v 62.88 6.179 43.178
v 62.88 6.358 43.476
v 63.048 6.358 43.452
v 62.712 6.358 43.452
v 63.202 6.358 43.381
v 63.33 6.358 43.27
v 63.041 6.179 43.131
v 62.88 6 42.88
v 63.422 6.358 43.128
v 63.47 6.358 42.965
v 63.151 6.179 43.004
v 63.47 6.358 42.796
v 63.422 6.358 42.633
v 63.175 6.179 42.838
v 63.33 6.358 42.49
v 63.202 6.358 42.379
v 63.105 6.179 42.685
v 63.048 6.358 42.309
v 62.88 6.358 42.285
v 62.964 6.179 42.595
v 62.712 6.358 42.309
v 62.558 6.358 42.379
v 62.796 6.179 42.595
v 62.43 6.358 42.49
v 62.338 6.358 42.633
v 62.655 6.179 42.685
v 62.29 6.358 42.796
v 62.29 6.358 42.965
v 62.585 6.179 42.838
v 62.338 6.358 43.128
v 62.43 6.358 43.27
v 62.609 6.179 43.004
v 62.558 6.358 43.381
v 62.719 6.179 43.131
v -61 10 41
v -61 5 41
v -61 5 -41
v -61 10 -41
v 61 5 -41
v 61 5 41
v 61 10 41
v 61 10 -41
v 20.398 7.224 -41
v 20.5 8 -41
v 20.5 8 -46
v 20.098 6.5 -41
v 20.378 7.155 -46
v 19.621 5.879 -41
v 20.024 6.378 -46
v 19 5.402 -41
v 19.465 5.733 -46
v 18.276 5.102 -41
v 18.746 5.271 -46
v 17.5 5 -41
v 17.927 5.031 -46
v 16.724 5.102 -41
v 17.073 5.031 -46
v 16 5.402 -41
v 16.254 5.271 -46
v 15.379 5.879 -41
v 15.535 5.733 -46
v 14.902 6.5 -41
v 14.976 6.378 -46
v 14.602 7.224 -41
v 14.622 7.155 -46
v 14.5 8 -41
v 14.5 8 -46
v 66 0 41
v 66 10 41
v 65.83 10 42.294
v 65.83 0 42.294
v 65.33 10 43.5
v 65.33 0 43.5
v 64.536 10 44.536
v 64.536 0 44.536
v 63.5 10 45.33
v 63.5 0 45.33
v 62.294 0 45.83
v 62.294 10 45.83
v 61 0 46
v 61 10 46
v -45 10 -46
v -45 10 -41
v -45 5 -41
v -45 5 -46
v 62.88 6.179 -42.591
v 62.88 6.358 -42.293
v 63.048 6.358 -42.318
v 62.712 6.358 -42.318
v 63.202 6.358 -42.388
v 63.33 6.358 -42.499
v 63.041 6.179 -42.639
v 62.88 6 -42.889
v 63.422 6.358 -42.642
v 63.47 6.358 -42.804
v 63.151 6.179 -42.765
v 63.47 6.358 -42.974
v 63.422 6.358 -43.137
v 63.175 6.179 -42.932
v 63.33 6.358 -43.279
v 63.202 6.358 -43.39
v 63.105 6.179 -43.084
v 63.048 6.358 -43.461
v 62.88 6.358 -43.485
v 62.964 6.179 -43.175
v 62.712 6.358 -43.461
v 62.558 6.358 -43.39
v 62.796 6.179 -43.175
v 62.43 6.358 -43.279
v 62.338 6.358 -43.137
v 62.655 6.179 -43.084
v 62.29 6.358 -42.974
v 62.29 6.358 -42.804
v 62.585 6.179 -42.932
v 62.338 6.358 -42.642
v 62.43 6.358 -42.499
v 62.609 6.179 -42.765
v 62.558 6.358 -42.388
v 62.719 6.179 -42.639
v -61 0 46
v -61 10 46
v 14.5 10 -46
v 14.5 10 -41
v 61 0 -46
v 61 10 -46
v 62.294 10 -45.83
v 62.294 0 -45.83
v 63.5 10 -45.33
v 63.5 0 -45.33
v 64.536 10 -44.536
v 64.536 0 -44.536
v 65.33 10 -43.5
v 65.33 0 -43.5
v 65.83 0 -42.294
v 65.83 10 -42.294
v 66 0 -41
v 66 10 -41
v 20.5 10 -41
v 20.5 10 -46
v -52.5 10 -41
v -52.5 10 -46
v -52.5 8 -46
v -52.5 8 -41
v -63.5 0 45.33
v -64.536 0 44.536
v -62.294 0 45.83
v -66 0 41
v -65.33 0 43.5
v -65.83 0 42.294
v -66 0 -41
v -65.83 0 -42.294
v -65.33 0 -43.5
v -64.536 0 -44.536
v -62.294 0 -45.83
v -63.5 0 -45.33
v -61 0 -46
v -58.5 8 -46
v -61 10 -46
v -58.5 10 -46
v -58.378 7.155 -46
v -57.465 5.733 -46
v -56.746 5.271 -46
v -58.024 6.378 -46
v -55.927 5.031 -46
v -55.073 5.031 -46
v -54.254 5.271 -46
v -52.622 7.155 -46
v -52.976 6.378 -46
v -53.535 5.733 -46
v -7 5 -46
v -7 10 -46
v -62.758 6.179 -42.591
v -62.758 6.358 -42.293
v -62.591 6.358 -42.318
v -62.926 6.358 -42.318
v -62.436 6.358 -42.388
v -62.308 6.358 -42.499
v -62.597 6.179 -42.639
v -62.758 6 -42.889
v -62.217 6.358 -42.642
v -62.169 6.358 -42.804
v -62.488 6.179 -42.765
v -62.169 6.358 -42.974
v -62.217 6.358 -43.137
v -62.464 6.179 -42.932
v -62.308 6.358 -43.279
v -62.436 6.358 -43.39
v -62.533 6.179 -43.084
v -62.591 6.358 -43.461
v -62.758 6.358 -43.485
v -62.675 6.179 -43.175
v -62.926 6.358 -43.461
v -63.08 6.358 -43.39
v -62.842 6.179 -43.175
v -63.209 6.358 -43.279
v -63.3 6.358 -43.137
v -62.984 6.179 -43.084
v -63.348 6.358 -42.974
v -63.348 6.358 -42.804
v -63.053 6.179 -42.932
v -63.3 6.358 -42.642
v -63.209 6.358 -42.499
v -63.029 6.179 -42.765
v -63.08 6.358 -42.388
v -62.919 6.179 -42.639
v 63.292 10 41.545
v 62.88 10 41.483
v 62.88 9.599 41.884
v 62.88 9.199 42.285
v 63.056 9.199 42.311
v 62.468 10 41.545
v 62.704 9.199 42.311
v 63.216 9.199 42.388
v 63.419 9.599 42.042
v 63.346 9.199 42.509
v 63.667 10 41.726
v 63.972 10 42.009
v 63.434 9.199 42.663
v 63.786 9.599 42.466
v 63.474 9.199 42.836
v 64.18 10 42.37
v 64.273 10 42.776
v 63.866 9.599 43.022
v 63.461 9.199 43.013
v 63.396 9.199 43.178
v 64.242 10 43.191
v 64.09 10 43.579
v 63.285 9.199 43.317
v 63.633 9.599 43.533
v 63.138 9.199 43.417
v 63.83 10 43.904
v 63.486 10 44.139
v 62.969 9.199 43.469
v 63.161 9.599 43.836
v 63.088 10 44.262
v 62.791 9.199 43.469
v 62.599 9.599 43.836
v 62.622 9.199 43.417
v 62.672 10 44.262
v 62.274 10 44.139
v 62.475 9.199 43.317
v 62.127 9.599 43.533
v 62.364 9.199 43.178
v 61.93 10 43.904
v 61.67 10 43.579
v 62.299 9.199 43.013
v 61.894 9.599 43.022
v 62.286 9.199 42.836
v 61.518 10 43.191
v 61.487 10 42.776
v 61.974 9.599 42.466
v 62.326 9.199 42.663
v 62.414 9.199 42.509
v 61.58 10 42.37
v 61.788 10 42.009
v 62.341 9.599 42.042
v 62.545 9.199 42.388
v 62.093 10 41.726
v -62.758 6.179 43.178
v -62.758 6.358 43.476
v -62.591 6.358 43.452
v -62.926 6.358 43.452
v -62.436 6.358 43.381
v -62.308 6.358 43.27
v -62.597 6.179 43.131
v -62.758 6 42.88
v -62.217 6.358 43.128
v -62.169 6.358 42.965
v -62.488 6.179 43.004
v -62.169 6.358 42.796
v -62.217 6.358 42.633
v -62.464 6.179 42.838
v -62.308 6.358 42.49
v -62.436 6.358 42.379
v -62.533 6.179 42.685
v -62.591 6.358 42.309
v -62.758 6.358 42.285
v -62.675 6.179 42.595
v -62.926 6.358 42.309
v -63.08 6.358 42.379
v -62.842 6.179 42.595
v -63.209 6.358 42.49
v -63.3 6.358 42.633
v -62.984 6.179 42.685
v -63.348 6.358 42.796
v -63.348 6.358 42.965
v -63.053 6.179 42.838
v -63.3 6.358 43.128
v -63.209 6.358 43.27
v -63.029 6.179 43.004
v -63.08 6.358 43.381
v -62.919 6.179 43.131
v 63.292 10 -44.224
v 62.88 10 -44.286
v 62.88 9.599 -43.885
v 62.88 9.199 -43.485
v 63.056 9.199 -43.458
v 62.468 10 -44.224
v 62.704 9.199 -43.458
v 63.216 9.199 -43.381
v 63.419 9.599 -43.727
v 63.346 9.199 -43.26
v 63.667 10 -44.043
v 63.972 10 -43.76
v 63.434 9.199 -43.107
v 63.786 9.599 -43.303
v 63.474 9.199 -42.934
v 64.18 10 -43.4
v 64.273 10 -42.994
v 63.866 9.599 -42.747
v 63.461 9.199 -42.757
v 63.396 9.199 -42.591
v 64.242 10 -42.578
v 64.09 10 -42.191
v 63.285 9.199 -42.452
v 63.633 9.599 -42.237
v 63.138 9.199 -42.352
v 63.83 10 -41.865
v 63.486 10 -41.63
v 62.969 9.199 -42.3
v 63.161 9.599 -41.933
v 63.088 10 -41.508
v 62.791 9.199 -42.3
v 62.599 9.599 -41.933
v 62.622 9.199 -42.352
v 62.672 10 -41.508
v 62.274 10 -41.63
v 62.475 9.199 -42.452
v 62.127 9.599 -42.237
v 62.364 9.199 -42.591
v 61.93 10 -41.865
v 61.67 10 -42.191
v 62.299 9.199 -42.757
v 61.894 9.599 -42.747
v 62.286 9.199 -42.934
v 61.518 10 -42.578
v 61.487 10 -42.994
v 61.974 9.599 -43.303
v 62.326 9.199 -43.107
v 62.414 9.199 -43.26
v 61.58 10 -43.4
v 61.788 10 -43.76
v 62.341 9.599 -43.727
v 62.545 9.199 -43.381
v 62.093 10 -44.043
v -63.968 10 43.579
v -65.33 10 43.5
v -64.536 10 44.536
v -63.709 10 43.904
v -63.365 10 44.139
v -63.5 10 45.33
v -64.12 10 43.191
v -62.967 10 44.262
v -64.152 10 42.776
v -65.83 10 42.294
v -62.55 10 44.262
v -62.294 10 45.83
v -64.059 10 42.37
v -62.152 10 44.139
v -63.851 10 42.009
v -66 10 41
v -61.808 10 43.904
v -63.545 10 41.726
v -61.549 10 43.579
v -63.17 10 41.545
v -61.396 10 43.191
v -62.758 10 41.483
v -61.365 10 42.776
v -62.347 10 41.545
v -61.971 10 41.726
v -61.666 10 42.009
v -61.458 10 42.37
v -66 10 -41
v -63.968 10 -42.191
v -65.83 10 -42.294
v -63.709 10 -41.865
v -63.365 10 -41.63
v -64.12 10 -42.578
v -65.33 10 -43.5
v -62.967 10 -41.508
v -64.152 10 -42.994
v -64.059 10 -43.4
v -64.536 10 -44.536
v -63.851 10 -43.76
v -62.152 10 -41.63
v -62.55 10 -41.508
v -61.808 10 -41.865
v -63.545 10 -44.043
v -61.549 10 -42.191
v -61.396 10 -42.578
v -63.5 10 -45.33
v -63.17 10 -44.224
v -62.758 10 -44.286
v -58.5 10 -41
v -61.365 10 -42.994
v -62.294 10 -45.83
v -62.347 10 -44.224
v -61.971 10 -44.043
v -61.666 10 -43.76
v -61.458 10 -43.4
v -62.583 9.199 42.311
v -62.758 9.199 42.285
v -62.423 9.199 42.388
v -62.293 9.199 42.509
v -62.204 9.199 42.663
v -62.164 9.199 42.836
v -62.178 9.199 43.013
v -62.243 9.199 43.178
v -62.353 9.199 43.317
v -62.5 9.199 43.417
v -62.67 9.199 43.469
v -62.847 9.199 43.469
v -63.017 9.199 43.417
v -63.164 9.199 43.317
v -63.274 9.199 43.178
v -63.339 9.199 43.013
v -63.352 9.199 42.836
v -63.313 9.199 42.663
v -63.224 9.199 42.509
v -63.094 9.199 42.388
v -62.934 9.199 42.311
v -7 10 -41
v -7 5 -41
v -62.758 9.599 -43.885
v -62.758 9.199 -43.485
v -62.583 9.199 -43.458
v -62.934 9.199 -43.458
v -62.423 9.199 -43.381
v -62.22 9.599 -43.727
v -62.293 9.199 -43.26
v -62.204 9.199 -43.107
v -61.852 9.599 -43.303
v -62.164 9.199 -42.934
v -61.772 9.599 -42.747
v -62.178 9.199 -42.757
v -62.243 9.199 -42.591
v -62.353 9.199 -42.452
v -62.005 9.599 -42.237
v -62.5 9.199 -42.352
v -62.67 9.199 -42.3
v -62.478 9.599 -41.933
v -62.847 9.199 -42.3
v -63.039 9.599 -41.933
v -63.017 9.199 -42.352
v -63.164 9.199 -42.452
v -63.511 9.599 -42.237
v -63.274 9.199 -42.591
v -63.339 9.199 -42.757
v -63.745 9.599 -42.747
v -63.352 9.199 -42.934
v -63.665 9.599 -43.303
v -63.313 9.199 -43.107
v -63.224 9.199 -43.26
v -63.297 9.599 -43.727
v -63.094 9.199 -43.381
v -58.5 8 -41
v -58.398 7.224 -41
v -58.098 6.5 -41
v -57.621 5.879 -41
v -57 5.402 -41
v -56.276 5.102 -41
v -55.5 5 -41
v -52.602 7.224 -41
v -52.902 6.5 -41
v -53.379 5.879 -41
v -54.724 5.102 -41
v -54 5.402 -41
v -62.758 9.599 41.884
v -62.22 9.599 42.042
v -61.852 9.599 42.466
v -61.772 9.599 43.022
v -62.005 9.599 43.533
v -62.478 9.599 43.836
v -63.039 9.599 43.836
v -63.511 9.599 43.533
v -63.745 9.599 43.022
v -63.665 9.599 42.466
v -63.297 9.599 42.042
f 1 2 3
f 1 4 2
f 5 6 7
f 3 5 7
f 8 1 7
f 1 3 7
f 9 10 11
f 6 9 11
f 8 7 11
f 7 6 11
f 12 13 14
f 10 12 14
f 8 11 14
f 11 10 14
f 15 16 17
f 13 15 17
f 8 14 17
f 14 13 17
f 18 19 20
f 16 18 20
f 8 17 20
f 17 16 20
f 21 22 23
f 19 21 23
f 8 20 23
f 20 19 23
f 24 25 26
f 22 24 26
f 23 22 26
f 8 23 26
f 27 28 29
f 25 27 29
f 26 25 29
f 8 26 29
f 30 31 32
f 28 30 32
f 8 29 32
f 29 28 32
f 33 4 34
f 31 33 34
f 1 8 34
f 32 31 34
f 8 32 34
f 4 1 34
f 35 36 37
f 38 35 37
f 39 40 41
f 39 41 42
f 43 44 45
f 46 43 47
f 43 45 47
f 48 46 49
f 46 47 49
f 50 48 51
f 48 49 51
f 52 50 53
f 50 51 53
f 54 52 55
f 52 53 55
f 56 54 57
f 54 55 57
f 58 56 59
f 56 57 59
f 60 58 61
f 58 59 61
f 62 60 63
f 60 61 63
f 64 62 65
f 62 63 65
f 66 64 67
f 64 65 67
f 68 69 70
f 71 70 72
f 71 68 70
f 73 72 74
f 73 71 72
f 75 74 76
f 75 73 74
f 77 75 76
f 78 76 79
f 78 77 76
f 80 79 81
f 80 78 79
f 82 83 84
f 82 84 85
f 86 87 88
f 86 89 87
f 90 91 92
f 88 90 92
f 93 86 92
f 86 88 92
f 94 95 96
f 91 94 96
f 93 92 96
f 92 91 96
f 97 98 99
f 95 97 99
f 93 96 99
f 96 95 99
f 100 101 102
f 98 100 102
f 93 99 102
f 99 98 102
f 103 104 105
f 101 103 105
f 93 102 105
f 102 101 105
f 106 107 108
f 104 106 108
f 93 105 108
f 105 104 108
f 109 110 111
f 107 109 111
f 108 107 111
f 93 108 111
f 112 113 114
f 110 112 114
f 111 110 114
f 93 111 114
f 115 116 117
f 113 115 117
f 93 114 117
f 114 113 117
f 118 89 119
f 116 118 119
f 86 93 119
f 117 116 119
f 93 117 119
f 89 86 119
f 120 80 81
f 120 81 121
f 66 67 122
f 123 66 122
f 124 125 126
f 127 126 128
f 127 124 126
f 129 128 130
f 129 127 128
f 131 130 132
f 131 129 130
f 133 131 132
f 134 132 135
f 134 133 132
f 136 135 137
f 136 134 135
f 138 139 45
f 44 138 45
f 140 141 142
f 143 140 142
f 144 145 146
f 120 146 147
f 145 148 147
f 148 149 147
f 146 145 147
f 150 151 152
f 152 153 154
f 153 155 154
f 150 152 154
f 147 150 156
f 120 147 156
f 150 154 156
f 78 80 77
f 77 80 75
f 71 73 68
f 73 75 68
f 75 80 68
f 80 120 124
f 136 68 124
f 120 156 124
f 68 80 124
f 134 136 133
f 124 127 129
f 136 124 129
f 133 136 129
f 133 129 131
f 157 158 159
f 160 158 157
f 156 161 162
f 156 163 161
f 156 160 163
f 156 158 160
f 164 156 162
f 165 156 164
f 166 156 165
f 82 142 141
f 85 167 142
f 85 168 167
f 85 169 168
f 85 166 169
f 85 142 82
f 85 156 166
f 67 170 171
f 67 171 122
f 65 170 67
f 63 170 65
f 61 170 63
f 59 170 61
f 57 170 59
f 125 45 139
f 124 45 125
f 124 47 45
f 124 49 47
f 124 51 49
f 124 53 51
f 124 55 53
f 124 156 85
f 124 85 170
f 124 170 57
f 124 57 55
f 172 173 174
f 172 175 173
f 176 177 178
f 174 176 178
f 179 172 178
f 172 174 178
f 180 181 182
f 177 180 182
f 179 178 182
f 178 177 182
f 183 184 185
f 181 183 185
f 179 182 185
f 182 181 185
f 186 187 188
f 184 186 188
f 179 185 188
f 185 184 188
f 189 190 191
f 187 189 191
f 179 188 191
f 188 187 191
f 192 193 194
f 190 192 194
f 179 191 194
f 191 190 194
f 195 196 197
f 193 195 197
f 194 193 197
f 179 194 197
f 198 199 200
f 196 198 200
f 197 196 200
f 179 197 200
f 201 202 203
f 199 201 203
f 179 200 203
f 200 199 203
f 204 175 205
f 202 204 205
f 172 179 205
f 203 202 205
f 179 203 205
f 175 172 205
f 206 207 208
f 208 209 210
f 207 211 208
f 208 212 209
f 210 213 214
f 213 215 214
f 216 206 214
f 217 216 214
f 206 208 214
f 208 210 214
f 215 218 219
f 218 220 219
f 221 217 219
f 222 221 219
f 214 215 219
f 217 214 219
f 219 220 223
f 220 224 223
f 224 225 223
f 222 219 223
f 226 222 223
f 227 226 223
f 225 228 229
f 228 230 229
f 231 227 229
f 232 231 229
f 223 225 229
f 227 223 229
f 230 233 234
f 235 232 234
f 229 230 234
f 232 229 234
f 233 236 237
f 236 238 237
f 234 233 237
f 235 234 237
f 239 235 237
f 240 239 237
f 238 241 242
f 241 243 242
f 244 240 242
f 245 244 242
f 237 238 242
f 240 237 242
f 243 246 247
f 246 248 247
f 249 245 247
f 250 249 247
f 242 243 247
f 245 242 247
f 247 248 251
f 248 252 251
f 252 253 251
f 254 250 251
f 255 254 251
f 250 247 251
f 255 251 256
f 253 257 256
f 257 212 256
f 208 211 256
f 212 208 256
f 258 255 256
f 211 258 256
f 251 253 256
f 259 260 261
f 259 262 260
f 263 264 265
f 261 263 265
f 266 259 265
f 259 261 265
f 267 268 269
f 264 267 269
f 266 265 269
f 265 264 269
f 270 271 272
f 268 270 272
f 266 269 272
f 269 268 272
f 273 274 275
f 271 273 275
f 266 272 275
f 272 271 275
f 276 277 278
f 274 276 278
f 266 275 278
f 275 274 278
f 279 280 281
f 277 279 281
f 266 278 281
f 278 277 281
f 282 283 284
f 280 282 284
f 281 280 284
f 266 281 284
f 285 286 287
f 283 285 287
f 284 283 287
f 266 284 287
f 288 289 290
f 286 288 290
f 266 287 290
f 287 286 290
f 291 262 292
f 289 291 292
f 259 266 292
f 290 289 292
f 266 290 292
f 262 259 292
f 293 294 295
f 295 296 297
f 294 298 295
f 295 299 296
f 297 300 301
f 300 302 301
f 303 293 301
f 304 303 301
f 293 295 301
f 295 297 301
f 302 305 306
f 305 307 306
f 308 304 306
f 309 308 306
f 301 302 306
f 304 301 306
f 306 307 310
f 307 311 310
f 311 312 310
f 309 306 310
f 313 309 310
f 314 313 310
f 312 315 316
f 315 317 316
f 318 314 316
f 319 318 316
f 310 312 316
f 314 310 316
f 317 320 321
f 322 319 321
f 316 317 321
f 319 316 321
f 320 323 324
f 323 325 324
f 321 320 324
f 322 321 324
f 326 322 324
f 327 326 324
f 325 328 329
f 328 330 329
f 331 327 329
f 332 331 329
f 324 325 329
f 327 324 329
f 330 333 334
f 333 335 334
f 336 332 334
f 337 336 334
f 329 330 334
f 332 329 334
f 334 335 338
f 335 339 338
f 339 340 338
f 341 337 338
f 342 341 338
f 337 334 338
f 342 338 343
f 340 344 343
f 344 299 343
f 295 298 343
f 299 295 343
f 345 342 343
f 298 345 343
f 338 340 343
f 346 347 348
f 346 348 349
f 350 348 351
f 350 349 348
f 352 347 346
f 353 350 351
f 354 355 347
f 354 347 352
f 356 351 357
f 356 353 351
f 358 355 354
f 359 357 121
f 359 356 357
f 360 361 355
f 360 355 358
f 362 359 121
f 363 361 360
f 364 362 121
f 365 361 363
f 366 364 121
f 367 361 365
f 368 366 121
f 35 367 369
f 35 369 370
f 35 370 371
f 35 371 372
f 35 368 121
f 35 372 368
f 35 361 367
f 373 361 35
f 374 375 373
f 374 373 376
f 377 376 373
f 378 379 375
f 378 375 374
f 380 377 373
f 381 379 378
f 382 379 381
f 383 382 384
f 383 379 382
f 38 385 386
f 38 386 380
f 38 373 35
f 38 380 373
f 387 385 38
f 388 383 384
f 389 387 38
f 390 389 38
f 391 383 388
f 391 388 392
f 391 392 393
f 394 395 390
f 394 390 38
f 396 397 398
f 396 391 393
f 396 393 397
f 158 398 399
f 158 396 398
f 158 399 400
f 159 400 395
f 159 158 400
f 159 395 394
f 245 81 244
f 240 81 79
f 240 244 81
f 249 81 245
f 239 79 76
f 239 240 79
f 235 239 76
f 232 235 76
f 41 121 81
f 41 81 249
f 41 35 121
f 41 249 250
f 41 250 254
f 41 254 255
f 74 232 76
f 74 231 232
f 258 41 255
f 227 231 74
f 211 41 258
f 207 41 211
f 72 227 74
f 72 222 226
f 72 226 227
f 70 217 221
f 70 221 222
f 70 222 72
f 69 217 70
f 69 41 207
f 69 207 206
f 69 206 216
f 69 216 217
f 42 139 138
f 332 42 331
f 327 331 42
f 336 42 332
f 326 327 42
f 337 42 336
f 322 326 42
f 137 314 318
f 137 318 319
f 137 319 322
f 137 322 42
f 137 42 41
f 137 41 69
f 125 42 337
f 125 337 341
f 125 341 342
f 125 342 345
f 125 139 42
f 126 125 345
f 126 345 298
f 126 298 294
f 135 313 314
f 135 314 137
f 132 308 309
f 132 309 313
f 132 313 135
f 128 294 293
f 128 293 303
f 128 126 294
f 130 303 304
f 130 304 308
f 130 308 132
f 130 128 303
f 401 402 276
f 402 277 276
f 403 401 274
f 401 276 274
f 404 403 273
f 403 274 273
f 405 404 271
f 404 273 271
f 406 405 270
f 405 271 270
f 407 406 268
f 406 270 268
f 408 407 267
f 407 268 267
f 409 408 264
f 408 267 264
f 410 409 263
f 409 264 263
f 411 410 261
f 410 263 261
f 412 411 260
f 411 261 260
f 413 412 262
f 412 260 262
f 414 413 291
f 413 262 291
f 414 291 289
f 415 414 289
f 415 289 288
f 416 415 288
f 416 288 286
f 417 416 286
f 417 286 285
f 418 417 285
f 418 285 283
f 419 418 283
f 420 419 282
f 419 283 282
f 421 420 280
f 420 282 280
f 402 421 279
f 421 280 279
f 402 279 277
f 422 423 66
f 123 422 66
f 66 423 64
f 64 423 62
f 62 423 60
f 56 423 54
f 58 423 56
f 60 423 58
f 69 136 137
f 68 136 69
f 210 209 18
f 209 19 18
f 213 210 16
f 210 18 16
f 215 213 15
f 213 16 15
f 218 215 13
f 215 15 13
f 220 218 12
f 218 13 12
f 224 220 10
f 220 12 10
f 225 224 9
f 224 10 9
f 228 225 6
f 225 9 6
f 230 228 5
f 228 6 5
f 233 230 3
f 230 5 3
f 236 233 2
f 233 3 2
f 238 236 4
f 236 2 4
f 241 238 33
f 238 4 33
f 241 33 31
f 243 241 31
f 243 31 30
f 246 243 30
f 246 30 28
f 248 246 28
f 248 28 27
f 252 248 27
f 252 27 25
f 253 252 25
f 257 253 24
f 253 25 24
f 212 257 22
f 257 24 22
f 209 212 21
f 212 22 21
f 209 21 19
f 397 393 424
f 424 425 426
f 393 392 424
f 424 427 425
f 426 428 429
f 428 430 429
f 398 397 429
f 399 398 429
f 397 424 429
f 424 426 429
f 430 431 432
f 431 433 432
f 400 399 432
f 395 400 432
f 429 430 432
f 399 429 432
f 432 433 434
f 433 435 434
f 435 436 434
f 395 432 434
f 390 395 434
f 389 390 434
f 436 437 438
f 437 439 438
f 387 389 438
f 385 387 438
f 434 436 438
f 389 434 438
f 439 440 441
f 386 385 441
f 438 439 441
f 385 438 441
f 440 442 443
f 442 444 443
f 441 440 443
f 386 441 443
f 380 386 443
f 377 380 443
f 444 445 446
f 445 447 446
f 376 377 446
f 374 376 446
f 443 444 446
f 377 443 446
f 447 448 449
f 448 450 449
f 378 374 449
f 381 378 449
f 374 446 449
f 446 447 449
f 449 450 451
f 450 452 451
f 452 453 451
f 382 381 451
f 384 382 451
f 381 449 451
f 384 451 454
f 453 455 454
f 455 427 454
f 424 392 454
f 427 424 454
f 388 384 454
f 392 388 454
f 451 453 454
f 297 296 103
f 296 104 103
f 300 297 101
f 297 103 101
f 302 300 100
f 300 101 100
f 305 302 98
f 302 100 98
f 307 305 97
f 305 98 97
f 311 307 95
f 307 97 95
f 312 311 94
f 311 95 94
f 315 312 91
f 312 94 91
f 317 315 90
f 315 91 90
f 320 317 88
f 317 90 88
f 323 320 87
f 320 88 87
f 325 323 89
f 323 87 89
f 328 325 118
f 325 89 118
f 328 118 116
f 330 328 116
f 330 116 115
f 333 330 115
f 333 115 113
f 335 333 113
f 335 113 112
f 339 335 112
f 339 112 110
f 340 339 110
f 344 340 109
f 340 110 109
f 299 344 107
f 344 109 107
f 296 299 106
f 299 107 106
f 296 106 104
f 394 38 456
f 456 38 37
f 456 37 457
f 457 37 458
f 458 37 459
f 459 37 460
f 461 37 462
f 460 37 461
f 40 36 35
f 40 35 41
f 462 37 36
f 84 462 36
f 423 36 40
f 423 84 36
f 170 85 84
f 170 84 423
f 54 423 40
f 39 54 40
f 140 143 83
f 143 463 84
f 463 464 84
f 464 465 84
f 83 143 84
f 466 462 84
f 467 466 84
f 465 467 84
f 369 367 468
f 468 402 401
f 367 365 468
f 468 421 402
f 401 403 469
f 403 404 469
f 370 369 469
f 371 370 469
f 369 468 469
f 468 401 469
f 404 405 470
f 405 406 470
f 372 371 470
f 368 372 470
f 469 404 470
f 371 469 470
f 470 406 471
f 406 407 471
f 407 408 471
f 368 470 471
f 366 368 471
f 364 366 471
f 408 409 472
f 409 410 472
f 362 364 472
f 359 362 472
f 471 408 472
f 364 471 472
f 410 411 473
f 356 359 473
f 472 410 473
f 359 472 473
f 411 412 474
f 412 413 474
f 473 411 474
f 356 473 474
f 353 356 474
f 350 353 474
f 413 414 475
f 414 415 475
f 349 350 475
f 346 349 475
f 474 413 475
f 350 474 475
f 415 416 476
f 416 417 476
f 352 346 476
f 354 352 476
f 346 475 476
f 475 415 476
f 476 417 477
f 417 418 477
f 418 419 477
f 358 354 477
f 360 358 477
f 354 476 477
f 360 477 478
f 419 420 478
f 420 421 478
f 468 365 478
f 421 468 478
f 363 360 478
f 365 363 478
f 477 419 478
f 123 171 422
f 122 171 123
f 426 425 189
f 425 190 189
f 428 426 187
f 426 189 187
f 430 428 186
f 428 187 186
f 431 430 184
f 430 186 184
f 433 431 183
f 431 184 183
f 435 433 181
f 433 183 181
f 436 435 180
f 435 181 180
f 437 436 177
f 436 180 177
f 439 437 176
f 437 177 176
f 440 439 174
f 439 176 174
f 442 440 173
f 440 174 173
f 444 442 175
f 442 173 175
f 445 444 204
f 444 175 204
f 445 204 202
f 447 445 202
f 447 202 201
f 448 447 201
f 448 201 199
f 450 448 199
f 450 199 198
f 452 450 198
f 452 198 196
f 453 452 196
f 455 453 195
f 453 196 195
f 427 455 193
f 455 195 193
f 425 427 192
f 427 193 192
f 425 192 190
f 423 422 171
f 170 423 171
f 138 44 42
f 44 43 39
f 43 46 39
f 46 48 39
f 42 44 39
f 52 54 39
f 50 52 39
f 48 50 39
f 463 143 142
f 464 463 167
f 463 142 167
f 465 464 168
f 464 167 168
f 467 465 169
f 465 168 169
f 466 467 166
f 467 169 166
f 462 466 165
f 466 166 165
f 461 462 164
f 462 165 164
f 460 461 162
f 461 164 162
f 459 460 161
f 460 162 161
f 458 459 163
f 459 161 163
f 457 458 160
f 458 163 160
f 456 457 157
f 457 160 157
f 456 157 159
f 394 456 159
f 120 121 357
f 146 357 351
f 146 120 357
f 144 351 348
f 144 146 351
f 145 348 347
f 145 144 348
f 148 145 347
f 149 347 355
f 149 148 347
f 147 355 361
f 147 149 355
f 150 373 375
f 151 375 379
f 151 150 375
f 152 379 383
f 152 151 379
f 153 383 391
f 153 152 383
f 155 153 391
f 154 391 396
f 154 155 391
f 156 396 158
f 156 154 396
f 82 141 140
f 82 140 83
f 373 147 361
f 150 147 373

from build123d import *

# Parameters (mm, degrees)
SKETCH2_W                       = 122
SKETCH2_H                       = 82
BOSS_EXTRUDE1_DEPTH             = 5
SKETCH2_3_W                     = 122
SKETCH2_3_H                     = 82
BOSS_EXTRUDE2_DEPTH             = 10
F_0_80_TAPPED_HOLE1_D           = 1.19126
F_0_80_TAPPED_HOLE1_DEPTH       = 3.642109389
F_0_80_TAPPED_HOLE1_CSINK_D     = 2.794
F_0_80_TAPPED_HOLE1_CSINK_ANGLE = 90
F_0_80_TAPPED_HOLE1_TIP         = 0.357890611
SKETCH8_W                       = 38
SKETCH8_H                       = 5
CUT_EXTRUDE1_DEPTH              = 5
CUT_EXTRUDE2_DEPTH              = 5
CUT_EXTRUDE3_DEPTH              = 5


with BuildPart() as part:
    # Sketch2 → Boss-Extrude1 (new body)
    # profile 1 of 2: a face of its own
    with BuildSketch(Plane(origin=(0, 0, 0), x_dir=(1, 0, 0), z_dir=(0, 1, 0))):
        with BuildLine():
            ThreePointArc((-66, 41), (-64.535533906, 44.535533906), (-61, 46))
            Line((-61, 46), (61, 46))
            ThreePointArc((61, 46), (64.535533906, 44.535533906), (66, 41))
            Line((66, 41), (66, -41))
            ThreePointArc((66, -41), (64.535533906, -44.535533906), (61, -46))
            Line((61, -46), (-61, -46))
            ThreePointArc((-61, -46), (-64.535533906, -44.535533906), (-66, -41))
            Line((-66, -41), (-66, 41))
        make_face()
        Rectangle(SKETCH2_W, SKETCH2_H, mode=Mode.SUBTRACT)
    # profile 2 of 2: a face of its own
    with BuildSketch(Plane(origin=(0, 0, 0), x_dir=(1, 0, 0), z_dir=(0, 1, 0))):
        Rectangle(SKETCH2_W, SKETCH2_H)
    extrude(amount=BOSS_EXTRUDE1_DEPTH)

    # Sketch2<3> → Boss-Extrude2 (add)
    with BuildSketch(Plane(origin=(0, 0, 0), x_dir=(1, 0, 0), z_dir=(0, 1, 0))):
        with BuildLine():
            Line((-61, -46), (61, -46))
            ThreePointArc((61, -46), (64.535533906, -44.535533906), (66, -41))
            Line((66, -41), (66, 41))
            ThreePointArc((66, 41), (64.535533906, 44.535533906), (61, 46))
            Line((61, 46), (-61, 46))
            ThreePointArc((-61, 46), (-64.535533906, 44.535533906), (-66, 41))
            Line((-66, 41), (-66, -41))
            ThreePointArc((-66, -41), (-64.535533906, -44.535533906), (-61, -46))
        make_face()
        Rectangle(SKETCH2_3_W, SKETCH2_3_H, mode=Mode.SUBTRACT)
    extrude(amount=BOSS_EXTRUDE2_DEPTH)

    # #0-80 Tapped Hole1
    with Locations(Plane(origin=(62.880041054, 10, -42.889125675), x_dir=(0, 0, 1), z_dir=(0, 1, 0))):
        with Locations((0, 0), (85.769428086, 0), (0, -125.638471979), (85.769428086, -125.638471979)):
            CounterSinkHole(F_0_80_TAPPED_HOLE1_D / 2, F_0_80_TAPPED_HOLE1_CSINK_D / 2, depth=F_0_80_TAPPED_HOLE1_DEPTH, counter_sink_angle=F_0_80_TAPPED_HOLE1_CSINK_ANGLE)
            with Locations((0, 0, -(F_0_80_TAPPED_HOLE1_DEPTH + F_0_80_TAPPED_HOLE1_TIP / 2))):  # 118° drill point
                Cone(0, F_0_80_TAPPED_HOLE1_D / 2, F_0_80_TAPPED_HOLE1_TIP, mode=Mode.SUBTRACT)

    # Sketch8 → Cut-Extrude1 (cut)
    with BuildSketch(Plane(origin=(0, 10, 0), x_dir=(1, 0, 0), z_dir=(0, 1, 0))):
        with Locations((-26, 43.5)):
            Rectangle(SKETCH8_W, SKETCH8_H)
    extrude(amount=-CUT_EXTRUDE1_DEPTH, mode=Mode.SUBTRACT)

    # Sketch9 → Cut-Extrude2 (cut)
    with BuildSketch(Plane(origin=(0, 0, -46), x_dir=(-1, 0, 0), z_dir=(0, 0, -1))):
        with BuildLine():
            Line((-20.5, 10), (-20.5, 8))
            ThreePointArc((-20.5, 8), (-17.5, 5), (-14.5, 8))
            Line((-14.5, 8), (-14.5, 10))
            Line((-14.5, 10), (-20.5, 10))
        make_face()
    extrude(amount=-CUT_EXTRUDE2_DEPTH, mode=Mode.SUBTRACT)

    # Sketch10 → Cut-Extrude3 (cut)
    with BuildSketch(Plane(origin=(0, 0, -46), x_dir=(-1, 0, 0), z_dir=(0, 0, -1))):
        with BuildLine():
            Line((52.5, 10), (52.5, 8))
            ThreePointArc((52.5, 8), (55.5, 5), (58.5, 8))
            Line((58.5, 8), (58.5, 10))
            Line((58.5, 10), (52.5, 10))
        make_face()
    extrude(amount=-CUT_EXTRUDE3_DEPTH, mode=Mode.SUBTRACT)


solid = part.part
